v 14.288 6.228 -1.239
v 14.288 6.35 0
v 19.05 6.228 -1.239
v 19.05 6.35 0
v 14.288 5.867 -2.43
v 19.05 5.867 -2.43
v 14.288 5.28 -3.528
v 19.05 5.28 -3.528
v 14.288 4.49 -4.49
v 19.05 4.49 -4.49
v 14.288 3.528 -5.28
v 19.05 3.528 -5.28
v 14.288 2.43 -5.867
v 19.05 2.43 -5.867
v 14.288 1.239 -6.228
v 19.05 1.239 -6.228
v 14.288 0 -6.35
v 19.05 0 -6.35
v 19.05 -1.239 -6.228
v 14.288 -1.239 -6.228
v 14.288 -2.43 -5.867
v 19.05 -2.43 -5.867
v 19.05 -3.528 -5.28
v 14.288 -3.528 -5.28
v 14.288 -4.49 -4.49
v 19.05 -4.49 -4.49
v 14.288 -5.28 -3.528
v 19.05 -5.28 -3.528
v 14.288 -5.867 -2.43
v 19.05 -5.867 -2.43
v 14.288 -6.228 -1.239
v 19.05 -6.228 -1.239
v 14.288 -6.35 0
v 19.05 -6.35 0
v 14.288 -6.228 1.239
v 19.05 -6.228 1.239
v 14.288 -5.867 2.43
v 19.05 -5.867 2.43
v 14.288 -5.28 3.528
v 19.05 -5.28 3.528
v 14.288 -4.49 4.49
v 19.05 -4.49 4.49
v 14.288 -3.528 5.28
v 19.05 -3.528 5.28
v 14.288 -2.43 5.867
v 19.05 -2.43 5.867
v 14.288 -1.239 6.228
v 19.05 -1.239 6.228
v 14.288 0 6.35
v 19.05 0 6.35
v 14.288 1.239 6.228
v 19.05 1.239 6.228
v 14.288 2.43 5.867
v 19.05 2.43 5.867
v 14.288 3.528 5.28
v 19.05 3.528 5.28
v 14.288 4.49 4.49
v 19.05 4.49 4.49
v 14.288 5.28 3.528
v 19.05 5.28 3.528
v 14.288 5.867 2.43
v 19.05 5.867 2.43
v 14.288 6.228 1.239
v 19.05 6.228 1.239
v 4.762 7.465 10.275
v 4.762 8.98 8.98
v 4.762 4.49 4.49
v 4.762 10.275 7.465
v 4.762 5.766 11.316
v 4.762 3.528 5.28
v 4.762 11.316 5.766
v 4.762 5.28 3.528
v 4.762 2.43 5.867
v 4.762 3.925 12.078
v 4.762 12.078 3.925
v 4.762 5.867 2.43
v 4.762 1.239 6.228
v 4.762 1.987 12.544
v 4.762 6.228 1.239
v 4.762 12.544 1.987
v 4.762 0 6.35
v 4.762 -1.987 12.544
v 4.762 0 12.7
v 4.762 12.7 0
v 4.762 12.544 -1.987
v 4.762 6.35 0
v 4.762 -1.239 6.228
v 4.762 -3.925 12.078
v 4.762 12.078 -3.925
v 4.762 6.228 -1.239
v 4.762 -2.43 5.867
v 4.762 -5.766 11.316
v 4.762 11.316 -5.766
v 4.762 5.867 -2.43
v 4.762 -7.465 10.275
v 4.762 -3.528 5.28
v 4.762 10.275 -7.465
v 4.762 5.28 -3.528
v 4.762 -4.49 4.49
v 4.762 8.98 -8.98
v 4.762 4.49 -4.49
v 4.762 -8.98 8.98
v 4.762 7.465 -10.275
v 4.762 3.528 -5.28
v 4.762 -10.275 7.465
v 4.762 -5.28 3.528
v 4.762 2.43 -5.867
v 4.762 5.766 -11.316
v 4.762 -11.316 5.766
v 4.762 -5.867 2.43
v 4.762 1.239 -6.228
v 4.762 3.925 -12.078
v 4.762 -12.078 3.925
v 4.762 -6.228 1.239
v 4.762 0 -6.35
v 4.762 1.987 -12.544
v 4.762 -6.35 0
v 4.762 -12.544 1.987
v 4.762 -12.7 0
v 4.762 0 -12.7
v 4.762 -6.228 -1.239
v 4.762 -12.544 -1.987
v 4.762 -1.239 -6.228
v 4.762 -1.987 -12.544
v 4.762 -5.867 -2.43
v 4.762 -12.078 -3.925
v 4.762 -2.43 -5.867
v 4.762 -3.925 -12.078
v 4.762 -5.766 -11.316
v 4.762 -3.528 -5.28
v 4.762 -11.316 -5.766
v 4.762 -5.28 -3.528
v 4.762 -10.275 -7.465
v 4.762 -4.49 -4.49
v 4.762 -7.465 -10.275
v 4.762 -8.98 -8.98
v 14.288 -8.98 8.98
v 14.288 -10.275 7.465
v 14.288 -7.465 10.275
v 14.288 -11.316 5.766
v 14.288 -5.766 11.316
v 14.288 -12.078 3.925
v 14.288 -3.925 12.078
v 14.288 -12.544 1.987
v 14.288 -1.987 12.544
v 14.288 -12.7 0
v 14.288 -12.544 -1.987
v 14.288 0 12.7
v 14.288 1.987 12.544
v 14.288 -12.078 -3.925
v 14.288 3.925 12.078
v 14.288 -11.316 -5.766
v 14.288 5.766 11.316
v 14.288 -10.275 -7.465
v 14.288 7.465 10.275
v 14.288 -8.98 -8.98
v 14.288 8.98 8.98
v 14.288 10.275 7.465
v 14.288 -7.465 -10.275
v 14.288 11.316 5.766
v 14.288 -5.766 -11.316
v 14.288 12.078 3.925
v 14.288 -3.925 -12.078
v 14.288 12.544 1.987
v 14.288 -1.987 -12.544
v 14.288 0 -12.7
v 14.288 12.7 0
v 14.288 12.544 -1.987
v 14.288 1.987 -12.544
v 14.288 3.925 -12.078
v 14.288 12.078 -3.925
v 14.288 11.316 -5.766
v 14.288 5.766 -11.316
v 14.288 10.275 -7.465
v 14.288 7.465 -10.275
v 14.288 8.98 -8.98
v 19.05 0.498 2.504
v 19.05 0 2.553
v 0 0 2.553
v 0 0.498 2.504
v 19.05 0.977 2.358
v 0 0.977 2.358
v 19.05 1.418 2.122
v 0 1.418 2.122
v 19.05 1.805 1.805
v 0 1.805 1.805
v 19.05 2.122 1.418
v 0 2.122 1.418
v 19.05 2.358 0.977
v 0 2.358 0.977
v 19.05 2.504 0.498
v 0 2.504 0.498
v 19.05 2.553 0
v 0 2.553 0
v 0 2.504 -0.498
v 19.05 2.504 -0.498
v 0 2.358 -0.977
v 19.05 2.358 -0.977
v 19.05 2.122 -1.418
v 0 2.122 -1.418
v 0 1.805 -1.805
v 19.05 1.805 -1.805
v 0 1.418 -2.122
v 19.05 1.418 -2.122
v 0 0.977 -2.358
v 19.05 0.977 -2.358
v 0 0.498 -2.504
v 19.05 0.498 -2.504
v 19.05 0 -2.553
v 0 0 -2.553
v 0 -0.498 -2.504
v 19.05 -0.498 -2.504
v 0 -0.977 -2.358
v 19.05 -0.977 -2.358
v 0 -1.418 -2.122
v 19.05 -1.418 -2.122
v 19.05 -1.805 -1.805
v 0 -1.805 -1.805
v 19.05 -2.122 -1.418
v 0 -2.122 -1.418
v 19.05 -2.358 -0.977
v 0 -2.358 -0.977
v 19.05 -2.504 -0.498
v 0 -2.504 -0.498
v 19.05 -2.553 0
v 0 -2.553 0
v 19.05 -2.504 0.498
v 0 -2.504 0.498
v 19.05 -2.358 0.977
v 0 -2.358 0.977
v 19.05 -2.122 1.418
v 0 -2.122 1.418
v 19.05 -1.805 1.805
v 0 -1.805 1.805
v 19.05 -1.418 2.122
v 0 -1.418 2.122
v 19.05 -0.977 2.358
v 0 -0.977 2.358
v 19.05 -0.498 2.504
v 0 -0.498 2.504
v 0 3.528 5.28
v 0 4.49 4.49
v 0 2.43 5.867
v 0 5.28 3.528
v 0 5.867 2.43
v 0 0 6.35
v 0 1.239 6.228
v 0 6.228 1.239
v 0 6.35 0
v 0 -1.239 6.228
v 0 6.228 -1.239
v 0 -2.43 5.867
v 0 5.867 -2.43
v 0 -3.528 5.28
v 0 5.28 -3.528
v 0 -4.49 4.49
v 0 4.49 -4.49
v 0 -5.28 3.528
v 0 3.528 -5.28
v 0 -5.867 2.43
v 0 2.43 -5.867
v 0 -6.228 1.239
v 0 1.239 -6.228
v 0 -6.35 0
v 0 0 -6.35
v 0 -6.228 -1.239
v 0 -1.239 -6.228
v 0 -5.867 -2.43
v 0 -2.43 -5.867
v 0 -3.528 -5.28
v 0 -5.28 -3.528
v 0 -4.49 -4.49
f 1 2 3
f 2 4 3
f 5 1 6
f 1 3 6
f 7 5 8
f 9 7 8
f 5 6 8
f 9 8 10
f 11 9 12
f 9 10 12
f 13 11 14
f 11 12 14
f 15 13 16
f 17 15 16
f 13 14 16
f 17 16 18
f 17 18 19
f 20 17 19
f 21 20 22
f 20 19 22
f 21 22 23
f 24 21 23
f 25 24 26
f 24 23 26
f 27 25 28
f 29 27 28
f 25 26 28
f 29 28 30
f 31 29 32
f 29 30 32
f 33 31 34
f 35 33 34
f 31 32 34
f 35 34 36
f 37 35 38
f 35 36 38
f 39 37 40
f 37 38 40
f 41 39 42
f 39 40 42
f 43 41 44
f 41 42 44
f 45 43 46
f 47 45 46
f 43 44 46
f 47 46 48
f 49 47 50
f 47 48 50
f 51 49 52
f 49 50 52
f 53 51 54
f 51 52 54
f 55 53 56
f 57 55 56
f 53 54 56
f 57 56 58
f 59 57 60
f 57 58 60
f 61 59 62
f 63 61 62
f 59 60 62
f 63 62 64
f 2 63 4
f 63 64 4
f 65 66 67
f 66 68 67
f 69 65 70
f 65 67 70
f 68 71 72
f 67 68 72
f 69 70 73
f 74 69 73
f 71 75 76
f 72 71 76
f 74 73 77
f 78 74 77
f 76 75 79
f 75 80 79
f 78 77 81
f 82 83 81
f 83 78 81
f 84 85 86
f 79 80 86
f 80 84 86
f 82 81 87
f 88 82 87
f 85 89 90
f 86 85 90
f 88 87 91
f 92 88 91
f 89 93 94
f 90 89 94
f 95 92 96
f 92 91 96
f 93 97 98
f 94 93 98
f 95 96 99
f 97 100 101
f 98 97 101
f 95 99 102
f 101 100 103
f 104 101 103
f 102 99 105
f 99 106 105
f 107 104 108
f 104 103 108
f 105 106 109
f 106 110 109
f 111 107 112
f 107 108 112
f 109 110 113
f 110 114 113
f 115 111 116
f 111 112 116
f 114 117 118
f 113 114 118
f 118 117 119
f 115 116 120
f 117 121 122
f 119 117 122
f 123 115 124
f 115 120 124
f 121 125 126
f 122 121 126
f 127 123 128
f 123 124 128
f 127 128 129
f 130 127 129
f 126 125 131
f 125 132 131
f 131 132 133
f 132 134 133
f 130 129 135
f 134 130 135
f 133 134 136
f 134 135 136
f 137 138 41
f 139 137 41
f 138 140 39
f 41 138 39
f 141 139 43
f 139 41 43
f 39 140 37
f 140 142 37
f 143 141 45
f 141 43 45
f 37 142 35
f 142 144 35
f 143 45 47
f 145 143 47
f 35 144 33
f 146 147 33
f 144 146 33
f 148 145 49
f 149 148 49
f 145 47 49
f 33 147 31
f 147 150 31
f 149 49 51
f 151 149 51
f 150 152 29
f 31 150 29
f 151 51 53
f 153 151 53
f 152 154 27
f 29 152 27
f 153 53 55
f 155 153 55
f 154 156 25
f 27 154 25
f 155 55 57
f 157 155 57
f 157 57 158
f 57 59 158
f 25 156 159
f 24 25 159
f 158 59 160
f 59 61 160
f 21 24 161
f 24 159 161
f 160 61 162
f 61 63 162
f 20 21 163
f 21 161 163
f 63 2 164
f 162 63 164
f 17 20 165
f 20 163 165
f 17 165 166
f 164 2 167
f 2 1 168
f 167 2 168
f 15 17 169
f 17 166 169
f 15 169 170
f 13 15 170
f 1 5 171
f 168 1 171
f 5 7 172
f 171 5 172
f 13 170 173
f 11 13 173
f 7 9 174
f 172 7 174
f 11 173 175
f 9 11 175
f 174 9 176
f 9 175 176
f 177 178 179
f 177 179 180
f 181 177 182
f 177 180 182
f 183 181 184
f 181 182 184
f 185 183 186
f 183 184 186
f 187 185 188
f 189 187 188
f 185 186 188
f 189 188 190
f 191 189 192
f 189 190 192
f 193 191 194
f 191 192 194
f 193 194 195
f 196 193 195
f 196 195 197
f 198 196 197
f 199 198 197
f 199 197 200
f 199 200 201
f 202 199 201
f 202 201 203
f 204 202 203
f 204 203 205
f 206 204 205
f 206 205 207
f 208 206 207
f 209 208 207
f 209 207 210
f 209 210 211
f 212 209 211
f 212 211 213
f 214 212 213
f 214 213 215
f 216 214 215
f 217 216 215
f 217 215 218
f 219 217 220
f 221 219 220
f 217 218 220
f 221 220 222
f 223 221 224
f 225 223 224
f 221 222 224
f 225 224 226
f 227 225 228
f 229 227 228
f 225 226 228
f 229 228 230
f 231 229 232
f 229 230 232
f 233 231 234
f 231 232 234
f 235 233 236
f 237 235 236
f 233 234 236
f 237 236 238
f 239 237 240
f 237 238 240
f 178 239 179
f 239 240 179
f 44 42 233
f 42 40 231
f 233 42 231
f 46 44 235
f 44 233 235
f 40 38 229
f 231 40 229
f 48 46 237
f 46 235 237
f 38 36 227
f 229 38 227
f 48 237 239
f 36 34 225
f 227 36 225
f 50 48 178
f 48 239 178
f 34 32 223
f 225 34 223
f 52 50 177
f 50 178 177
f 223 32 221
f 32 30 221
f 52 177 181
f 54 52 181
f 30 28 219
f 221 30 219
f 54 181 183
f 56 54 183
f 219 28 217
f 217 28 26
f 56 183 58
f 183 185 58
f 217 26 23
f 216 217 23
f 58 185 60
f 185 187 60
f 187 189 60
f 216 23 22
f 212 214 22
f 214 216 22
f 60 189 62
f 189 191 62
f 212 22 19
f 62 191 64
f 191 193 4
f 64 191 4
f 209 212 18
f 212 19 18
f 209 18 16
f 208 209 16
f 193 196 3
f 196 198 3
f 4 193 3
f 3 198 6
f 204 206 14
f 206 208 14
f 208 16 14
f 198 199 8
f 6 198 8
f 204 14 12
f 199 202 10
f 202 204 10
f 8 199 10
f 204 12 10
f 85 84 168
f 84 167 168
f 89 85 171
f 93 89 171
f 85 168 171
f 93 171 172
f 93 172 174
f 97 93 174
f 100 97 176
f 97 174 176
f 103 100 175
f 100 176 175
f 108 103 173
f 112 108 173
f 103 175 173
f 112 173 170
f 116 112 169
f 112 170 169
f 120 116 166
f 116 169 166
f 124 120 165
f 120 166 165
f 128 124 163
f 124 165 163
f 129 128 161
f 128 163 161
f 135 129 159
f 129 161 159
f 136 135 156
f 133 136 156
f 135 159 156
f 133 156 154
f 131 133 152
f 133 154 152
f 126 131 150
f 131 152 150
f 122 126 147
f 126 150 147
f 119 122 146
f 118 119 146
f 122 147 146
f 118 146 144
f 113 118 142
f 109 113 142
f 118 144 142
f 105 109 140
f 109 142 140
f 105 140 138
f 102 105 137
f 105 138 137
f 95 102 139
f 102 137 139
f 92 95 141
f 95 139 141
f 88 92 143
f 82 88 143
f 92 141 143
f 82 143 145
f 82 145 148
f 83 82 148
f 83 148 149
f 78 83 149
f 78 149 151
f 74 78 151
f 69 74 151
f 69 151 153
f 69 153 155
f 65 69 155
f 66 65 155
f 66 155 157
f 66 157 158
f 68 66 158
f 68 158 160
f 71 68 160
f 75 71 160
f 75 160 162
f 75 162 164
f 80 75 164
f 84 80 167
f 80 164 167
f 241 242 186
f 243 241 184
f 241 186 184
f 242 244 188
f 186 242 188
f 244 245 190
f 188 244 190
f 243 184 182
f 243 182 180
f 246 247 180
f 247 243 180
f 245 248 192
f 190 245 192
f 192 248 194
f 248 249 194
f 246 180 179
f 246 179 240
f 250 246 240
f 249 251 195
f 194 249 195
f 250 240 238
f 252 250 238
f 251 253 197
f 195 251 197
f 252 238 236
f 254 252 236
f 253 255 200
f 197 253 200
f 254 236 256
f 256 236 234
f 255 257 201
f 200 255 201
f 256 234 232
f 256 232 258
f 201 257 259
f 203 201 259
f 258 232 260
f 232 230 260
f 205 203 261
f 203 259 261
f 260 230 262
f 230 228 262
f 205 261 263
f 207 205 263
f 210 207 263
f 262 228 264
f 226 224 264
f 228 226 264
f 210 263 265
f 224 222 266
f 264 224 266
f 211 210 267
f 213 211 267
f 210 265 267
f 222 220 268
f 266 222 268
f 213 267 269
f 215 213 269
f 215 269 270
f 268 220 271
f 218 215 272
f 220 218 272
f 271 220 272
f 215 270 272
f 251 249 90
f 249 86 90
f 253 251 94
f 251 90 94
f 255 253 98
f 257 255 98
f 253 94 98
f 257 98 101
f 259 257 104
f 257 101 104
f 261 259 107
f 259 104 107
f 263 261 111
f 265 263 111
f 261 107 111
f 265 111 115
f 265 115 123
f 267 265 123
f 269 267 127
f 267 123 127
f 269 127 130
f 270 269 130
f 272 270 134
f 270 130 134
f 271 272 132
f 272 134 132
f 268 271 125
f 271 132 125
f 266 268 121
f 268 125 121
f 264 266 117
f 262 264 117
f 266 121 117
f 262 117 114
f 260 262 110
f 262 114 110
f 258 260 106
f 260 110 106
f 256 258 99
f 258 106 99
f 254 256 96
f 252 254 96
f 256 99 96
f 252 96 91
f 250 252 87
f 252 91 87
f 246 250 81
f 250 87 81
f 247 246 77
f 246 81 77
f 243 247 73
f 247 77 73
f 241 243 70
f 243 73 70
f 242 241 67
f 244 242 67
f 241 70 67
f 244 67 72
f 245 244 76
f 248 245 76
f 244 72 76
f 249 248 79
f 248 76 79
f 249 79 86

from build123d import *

# Parameters (mm, degrees)
F_1_4_20_TAPPED_HOLE1_D = 5.1054


with BuildPart() as part:
    # Sketch1 → Revolve1 (revolve)
    with BuildSketch(Plane.XY):
        Polygon((0, 0), (0, 6.35), (4.7625, 6.35), (4.7625, 12.7), (14.2875, 12.7), (14.2875, 6.35), (19.05, 6.35), (19.05, 0), align=None)
    revolve(axis=Axis((19.05, 0, 0), (-1, 0, 0)))

    # 1/4-20 Tapped Hole1 (through all)
    with Locations(Plane(origin=(19.05, 0, 0), x_dir=(0, 0, -1), z_dir=(1, 0, 0))):
        with Locations((0, 0)):
            Hole(F_1_4_20_TAPPED_HOLE1_D / 2)


solid = part.part
